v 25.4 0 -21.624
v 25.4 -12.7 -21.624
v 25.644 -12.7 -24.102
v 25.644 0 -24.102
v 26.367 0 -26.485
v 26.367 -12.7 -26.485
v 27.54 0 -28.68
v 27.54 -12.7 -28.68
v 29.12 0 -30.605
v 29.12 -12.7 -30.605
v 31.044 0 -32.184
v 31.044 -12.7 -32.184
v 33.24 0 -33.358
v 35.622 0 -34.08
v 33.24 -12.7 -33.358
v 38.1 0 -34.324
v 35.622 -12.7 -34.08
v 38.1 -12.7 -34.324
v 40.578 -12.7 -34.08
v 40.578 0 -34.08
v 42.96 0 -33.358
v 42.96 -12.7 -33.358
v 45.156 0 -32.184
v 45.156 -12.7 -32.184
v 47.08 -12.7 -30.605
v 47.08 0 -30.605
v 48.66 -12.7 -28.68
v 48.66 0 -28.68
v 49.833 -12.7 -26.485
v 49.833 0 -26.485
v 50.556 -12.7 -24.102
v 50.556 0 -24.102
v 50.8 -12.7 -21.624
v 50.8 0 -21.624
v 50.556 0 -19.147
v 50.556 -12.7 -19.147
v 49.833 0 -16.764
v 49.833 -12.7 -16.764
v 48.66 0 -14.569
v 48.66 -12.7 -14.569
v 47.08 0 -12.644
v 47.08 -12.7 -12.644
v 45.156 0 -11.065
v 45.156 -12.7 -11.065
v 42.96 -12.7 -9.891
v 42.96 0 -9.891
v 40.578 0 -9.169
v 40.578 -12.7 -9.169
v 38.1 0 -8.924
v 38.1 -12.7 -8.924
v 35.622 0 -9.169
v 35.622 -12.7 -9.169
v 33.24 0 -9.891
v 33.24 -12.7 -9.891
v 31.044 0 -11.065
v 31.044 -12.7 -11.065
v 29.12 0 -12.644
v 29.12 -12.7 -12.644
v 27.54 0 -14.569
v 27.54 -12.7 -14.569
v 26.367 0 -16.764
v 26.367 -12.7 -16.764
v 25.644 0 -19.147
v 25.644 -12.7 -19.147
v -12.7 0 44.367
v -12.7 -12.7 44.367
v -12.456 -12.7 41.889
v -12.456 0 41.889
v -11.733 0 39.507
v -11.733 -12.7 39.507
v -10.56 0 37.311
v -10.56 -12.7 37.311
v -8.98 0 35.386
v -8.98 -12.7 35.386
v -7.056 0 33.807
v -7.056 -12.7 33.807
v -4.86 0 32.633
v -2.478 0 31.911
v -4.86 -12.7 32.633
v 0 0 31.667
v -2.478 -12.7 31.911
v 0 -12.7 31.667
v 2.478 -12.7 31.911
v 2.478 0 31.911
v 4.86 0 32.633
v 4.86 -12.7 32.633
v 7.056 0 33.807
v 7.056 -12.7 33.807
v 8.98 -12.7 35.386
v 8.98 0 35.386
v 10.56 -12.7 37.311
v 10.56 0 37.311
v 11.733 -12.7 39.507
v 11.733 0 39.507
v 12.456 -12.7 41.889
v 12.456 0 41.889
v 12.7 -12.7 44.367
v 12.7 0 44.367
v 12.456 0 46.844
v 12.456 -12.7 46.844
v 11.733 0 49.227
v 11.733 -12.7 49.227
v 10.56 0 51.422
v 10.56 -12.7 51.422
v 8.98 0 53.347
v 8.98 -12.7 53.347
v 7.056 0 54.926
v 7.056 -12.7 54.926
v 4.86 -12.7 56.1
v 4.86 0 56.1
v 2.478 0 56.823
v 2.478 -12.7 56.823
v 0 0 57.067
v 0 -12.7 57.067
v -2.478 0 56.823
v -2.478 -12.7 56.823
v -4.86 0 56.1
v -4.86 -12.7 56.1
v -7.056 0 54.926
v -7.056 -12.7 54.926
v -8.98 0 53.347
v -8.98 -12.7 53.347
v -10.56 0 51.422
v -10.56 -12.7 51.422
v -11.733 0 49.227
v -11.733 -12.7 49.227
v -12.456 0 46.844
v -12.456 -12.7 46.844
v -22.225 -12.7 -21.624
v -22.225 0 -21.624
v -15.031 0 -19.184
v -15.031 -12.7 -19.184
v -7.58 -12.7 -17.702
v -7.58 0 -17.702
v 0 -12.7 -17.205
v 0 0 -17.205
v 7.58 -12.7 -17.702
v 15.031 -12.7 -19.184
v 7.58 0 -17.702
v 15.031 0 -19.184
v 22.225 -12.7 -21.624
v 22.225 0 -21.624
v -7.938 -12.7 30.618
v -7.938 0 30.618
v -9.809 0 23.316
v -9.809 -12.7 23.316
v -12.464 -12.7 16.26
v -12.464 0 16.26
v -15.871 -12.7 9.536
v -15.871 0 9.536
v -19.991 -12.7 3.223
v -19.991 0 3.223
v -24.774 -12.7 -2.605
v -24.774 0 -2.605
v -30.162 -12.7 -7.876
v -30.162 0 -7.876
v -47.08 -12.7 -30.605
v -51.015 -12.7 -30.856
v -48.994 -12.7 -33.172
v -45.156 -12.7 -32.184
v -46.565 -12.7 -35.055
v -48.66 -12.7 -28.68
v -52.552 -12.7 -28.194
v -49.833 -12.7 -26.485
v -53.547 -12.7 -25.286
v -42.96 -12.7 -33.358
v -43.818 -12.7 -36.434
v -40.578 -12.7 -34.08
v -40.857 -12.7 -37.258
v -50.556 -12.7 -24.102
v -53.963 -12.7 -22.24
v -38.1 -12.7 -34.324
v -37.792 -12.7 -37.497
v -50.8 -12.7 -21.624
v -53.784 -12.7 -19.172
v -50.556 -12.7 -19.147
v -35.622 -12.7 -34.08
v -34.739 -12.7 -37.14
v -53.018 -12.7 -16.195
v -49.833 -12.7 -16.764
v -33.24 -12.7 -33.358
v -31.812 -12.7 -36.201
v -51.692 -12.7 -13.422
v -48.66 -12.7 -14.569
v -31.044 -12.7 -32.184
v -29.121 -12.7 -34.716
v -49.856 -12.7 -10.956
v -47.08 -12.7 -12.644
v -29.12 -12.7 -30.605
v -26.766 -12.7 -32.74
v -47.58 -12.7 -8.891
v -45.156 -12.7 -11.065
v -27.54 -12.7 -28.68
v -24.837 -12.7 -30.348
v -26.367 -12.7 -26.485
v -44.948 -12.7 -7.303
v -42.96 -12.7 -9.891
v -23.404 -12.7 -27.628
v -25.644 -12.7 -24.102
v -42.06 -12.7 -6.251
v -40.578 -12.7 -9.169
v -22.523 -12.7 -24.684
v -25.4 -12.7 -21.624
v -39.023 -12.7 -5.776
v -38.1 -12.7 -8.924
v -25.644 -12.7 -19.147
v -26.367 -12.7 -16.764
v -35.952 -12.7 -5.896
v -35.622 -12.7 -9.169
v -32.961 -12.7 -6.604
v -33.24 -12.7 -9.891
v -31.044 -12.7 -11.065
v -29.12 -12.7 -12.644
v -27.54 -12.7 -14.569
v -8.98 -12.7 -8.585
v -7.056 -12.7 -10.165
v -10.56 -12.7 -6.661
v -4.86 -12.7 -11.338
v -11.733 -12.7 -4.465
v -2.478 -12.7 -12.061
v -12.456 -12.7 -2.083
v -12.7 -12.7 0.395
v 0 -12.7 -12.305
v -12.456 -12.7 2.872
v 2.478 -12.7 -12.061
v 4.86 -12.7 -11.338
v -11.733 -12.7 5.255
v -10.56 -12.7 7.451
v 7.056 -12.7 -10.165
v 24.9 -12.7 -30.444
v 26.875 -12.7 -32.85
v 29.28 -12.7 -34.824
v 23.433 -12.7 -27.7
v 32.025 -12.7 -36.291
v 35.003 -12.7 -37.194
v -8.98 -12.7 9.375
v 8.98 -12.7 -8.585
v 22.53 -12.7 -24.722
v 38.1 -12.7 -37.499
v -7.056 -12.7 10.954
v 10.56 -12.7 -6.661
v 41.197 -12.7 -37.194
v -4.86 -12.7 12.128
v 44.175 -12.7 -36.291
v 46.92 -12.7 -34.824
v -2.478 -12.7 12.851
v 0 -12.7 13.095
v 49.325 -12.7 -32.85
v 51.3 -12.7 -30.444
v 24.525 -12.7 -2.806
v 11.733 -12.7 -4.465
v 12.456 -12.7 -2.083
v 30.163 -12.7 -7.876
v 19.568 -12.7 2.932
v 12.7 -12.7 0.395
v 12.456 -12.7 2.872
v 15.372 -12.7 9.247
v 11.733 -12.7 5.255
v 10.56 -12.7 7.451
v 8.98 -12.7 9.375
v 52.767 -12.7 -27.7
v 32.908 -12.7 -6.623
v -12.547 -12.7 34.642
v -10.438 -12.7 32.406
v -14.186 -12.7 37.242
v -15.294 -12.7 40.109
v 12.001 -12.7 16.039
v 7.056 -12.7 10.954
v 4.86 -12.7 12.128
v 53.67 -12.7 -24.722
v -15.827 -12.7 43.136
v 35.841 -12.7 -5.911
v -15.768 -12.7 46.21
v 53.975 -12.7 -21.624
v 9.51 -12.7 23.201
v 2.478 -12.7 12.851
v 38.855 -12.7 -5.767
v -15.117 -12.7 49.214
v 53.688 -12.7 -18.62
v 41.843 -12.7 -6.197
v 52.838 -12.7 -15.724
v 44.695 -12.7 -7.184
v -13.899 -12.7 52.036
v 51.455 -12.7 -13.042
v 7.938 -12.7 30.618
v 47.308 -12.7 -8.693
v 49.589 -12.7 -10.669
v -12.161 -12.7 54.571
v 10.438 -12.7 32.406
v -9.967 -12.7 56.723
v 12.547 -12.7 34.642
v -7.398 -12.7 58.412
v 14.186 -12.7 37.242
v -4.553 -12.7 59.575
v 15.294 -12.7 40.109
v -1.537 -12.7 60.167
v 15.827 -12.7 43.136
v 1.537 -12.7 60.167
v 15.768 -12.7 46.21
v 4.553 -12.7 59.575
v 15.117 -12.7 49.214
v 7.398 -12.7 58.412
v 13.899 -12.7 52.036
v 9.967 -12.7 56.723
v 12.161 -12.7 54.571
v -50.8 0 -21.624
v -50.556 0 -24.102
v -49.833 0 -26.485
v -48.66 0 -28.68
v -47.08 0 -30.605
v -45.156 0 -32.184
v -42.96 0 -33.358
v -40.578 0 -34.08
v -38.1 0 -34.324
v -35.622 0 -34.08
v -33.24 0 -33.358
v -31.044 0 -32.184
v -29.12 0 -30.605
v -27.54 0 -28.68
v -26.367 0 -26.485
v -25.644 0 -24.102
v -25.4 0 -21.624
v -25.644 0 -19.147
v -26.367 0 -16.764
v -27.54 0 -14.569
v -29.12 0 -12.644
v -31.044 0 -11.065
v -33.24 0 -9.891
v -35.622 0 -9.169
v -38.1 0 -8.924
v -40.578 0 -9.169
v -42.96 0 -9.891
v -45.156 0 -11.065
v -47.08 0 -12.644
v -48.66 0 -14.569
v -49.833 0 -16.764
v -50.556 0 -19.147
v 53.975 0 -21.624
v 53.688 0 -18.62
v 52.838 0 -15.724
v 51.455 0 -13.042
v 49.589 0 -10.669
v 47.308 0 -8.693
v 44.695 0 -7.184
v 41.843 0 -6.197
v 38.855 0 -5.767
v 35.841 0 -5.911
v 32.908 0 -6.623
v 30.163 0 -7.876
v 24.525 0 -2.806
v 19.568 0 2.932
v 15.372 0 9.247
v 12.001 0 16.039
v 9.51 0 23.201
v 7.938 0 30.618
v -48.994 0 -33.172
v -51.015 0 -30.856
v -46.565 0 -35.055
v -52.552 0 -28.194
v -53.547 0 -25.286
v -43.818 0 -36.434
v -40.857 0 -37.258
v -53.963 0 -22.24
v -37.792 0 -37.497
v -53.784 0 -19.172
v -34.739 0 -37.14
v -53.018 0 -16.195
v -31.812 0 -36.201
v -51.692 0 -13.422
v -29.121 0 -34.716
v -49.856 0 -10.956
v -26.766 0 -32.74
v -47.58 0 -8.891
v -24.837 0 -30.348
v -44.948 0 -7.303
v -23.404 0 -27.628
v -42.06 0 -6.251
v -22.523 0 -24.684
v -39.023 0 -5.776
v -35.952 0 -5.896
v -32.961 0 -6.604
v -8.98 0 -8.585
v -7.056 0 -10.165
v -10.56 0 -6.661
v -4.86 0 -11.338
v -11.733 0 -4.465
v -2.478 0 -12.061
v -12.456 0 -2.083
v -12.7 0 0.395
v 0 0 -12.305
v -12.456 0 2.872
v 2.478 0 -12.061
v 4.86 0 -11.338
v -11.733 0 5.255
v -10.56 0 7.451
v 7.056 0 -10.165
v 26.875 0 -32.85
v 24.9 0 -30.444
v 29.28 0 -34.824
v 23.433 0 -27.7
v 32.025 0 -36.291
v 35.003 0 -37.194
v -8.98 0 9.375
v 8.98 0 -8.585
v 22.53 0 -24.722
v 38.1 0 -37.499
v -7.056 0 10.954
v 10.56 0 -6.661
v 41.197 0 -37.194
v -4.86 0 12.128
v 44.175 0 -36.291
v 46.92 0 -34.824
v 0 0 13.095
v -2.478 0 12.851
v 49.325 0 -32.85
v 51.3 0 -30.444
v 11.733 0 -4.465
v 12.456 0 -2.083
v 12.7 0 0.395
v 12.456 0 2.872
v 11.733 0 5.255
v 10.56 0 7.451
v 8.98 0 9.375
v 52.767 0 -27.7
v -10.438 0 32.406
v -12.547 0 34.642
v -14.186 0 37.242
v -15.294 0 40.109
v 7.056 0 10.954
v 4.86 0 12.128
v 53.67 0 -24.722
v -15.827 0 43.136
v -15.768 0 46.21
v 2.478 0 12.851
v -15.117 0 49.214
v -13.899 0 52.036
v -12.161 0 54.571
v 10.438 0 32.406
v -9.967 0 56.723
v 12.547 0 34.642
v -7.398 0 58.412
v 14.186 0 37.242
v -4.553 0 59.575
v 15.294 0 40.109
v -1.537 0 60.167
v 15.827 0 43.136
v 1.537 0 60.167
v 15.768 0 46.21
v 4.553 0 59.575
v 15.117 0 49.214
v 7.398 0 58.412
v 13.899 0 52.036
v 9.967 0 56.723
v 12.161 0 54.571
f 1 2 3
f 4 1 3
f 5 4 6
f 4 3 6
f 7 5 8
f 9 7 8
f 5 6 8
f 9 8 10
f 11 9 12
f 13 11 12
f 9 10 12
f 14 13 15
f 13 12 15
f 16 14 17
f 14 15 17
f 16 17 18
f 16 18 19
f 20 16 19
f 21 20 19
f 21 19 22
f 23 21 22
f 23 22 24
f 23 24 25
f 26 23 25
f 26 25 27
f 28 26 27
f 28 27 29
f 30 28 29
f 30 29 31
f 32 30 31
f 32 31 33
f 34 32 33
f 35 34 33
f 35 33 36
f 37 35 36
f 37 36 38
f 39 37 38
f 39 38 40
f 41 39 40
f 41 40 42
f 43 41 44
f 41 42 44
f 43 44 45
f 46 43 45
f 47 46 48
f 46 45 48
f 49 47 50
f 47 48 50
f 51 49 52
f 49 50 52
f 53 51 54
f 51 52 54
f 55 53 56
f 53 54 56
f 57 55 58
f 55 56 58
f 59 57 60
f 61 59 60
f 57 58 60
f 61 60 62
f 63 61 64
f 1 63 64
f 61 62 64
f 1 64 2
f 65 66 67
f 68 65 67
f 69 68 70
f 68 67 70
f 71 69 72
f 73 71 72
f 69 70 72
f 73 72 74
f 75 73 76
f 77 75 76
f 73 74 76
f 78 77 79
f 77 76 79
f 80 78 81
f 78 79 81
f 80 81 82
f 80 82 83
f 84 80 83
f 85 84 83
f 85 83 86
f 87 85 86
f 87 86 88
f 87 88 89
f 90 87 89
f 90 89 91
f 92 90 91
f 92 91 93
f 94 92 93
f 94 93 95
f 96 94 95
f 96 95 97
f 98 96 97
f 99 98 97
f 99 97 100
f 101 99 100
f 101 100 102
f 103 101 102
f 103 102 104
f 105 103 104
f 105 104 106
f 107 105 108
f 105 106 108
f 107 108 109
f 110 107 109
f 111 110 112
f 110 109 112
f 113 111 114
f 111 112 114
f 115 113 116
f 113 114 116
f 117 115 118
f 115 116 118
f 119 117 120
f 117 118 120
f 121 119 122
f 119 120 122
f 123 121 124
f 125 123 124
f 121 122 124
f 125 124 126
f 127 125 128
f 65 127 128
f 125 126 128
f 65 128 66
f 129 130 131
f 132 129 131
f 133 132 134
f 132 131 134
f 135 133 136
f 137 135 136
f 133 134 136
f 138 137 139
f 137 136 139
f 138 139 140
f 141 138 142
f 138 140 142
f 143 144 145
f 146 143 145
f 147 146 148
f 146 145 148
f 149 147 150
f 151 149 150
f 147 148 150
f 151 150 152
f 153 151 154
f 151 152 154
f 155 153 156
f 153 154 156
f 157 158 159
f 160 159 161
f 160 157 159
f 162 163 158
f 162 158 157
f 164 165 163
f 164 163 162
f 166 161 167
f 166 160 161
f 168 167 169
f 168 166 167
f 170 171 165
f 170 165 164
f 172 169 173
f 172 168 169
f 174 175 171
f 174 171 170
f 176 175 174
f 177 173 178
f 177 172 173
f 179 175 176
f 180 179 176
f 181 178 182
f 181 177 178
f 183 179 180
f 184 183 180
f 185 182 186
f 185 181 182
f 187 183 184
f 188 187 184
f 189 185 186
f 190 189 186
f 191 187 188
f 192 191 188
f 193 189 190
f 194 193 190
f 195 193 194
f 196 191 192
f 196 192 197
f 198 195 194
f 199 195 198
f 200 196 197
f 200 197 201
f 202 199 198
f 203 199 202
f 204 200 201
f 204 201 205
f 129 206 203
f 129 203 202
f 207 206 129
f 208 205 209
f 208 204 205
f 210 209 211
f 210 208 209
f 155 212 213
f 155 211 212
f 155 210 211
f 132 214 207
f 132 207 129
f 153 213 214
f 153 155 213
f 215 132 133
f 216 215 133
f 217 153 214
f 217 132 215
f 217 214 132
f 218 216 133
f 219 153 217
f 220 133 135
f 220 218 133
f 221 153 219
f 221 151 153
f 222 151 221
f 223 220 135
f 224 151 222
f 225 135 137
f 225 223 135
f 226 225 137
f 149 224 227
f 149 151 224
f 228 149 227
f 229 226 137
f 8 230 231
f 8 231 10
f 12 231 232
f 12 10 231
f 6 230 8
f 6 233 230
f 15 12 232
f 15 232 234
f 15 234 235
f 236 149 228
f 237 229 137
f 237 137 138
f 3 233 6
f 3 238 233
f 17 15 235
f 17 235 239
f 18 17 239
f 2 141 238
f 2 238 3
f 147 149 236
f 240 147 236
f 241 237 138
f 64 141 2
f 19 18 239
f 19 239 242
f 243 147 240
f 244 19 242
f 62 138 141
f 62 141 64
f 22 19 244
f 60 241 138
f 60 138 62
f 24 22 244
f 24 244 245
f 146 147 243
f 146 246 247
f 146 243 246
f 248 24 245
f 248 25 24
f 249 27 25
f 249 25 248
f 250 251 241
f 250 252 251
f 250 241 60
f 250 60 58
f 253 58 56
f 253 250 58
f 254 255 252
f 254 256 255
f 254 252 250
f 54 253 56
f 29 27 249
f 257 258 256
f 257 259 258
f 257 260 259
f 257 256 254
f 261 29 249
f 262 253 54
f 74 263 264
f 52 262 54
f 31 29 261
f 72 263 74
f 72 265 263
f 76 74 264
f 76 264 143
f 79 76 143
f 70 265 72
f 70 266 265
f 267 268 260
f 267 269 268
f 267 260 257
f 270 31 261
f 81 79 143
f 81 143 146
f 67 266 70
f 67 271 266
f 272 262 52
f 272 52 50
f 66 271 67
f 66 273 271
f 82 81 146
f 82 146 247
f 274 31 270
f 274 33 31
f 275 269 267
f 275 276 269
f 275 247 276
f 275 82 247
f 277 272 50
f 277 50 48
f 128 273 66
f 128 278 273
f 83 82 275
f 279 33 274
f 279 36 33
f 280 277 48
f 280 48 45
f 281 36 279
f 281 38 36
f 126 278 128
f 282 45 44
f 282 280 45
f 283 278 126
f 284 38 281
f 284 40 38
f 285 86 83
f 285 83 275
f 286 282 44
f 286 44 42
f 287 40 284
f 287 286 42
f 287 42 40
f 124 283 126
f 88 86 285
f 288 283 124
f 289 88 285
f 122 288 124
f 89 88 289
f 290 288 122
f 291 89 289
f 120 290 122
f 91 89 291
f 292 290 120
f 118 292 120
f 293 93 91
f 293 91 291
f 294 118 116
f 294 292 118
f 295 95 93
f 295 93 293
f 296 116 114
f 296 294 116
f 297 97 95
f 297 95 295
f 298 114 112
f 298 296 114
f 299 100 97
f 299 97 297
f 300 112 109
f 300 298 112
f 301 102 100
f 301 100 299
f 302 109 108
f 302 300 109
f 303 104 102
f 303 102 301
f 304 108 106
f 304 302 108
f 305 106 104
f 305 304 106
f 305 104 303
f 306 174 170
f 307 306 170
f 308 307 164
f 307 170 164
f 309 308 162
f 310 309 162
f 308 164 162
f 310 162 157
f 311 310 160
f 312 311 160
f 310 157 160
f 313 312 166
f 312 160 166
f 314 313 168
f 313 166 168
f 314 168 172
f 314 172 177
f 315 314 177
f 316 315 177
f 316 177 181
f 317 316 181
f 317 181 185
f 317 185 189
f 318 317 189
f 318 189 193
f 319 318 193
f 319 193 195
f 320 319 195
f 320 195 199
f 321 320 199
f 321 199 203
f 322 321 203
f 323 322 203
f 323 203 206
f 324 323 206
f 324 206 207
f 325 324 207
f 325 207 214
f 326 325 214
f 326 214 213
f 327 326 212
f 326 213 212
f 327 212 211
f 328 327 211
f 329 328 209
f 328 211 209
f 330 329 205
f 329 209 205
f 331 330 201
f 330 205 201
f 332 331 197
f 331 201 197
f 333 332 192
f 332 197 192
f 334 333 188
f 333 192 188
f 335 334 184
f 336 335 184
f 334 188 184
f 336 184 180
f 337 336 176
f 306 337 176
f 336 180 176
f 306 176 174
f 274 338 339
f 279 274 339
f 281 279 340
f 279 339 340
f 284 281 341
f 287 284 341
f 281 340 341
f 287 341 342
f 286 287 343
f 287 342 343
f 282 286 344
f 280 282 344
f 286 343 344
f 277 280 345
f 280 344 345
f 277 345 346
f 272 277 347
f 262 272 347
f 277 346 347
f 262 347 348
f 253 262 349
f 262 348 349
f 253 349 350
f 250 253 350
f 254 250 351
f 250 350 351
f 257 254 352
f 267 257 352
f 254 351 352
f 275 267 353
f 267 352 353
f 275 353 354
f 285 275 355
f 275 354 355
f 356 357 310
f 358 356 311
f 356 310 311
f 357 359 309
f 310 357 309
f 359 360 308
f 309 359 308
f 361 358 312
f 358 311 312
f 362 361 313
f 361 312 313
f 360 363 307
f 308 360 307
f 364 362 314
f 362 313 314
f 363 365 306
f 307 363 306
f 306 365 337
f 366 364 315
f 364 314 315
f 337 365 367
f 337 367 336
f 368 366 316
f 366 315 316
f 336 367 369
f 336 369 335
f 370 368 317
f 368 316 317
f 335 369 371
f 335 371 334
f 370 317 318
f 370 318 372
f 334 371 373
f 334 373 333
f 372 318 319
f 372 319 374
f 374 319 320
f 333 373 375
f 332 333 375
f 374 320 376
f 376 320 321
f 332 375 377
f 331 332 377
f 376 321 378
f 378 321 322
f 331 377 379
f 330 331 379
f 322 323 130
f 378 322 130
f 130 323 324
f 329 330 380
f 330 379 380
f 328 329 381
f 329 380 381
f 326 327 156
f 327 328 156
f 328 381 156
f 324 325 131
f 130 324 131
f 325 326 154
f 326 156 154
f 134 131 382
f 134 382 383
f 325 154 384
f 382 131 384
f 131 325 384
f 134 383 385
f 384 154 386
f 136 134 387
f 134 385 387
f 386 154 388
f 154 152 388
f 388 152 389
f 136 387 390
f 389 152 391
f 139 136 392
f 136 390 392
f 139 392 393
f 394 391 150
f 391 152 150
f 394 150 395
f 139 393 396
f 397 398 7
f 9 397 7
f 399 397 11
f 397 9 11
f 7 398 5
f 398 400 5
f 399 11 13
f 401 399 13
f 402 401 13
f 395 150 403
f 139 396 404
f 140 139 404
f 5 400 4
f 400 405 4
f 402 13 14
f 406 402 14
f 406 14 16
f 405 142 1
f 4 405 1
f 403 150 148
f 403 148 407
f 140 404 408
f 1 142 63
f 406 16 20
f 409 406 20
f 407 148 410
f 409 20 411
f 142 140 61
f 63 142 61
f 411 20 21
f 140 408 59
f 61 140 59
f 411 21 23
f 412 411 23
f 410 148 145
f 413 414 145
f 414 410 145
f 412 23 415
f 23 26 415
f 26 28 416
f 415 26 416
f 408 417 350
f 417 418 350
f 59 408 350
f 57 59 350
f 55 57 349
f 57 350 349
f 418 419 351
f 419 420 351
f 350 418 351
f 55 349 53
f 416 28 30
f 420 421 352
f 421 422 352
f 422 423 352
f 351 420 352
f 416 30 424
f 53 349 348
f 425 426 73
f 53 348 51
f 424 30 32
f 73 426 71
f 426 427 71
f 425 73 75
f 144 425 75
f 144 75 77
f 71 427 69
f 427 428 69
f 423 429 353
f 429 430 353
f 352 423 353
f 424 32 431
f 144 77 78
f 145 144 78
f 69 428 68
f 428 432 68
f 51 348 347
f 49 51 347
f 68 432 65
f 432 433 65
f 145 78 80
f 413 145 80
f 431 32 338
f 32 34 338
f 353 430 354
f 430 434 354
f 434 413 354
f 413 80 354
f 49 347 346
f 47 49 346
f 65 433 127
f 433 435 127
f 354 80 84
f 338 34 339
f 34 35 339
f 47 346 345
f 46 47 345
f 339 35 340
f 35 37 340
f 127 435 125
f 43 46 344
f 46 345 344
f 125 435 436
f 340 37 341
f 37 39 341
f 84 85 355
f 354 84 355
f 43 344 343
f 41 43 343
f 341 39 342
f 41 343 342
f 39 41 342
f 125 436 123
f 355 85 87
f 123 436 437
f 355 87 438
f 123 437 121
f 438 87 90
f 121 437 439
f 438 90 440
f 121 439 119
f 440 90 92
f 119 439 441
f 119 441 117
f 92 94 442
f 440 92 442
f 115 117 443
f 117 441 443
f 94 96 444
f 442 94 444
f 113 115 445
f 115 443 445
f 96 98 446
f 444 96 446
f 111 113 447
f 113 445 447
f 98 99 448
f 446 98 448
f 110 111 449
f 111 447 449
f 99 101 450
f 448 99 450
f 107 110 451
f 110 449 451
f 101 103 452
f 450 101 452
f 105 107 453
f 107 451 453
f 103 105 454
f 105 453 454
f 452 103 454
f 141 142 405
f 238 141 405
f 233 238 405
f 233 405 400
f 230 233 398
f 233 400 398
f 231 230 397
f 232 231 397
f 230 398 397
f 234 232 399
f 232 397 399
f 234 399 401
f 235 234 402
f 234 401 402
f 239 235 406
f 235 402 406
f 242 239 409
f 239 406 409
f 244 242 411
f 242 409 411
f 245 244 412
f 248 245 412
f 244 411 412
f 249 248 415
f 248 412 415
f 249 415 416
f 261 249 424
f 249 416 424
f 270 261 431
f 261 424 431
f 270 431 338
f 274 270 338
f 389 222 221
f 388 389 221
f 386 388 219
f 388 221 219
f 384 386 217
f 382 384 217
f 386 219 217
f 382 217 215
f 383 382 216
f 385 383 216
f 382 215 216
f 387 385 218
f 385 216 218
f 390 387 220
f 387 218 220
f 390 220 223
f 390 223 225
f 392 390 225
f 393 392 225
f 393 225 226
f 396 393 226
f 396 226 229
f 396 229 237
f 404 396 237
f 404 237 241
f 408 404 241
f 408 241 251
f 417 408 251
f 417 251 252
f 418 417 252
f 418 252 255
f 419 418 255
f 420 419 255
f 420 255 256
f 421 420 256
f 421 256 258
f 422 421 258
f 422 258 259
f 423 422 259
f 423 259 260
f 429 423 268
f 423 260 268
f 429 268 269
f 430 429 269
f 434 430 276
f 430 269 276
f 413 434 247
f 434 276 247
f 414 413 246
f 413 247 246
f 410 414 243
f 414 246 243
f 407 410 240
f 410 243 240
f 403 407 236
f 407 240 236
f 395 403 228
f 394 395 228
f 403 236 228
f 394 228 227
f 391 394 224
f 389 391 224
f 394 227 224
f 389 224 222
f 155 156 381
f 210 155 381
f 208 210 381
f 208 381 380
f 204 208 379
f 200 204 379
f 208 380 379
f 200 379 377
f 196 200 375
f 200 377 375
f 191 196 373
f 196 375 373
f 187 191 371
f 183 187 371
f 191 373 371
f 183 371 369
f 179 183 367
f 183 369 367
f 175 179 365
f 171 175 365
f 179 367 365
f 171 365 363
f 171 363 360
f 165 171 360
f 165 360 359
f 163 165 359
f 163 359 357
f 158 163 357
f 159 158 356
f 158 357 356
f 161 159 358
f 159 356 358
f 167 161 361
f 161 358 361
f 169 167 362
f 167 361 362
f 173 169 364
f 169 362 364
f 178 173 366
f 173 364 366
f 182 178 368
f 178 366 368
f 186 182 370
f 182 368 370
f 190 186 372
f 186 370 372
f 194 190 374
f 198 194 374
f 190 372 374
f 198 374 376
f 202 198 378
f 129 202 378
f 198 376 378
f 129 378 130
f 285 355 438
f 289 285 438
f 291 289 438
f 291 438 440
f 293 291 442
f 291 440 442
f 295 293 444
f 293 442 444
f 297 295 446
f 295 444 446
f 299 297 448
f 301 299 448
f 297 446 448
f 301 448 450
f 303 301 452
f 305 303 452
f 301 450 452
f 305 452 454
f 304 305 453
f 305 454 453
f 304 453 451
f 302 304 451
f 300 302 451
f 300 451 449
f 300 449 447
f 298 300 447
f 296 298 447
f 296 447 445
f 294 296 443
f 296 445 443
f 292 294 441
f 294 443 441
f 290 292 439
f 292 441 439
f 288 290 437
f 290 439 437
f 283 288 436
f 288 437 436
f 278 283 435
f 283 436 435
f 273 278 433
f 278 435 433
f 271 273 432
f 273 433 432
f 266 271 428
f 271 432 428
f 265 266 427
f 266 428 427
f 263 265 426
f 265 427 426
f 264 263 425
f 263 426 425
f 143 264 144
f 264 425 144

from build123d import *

# Parameters (mm, degrees)
F0_R     = 15.7260613119
F1_DEPTH = 12.7
F2_D     = 25.4


with BuildPart() as f1:
    # F0 (on Front) → F1 (new body)
    with BuildSketch(Plane.XZ):
        with BuildLine():
            ThreePointArc((-22.225, -21.624488881), (-24.3518467149, -13.686988881), (-30.1625, -7.8763355959))
            ThreePointArc((-30.1625, -7.8763355959), (-51.8481532851, -29.561988881), (-22.225, -21.624488881))
        make_face()
        with BuildLine():
            ThreePointArc((7.9375, 30.6184936023), (0, 28.4916468874), (-7.9375, 30.6184936023))
            ThreePointArc((-7.9375, 30.6184936023), (-15.8714708467, 9.5359543409), (-30.1625, -7.8763355959))
            ThreePointArc((-30.1625, -7.8763355959), (-24.3518467149, -13.686988881), (-22.225, -21.624488881))
            ThreePointArc((-22.225, -21.624488881), (0, -17.2054544996), (22.225, -21.624488881))
            ThreePointArc((22.225, -21.624488881), (24.3518467149, -13.686988881), (30.1625, -7.8763355959))
            ThreePointArc((30.1625, -7.8763355959), (15.3716015359, 9.2473546597), (7.9375, 30.6184936023))
        make_face()
        with Locations((0, 0.3947862569)):
            Circle(F0_R, mode=Mode.SUBTRACT)
        with BuildLine():
            ThreePointArc((53.975, -21.624488881), (46.0375, -7.8763355959), (30.1625, -7.8763355959))
            ThreePointArc((30.1625, -7.8763355959), (24.3518467149, -13.686988881), (22.225, -21.624488881))
            ThreePointArc((22.225, -21.624488881), (38.1, -37.499488881), (53.975, -21.624488881))
        make_face()
        with Locations((0, 0.3947862569)):
            Circle(F0_R)
        with BuildLine():
            ThreePointArc((7.9375, 30.6184936023), (13.7481532851, 36.4291468874), (15.875, 44.3666468874))
            ThreePointArc((15.875, 44.3666468874), (-7.9375, 58.1148001724), (-7.9375, 30.6184936023))
            ThreePointArc((-7.9375, 30.6184936023), (0, 28.4916468874), (7.9375, 30.6184936023))
        make_face()
    extrude(amount=F1_DEPTH)

    # F2 (through all)
    with Locations(Plane(origin=(0, 0, 0), x_dir=(1, 0, 0), z_dir=(0, 1, 0))):
        with Locations((-38.1, 21.624488881), (38.1, 21.624488881), (0, -44.3666468874), (0, -0.3947862569)):
            Hole(F2_D / 2)


solid = f1.part
